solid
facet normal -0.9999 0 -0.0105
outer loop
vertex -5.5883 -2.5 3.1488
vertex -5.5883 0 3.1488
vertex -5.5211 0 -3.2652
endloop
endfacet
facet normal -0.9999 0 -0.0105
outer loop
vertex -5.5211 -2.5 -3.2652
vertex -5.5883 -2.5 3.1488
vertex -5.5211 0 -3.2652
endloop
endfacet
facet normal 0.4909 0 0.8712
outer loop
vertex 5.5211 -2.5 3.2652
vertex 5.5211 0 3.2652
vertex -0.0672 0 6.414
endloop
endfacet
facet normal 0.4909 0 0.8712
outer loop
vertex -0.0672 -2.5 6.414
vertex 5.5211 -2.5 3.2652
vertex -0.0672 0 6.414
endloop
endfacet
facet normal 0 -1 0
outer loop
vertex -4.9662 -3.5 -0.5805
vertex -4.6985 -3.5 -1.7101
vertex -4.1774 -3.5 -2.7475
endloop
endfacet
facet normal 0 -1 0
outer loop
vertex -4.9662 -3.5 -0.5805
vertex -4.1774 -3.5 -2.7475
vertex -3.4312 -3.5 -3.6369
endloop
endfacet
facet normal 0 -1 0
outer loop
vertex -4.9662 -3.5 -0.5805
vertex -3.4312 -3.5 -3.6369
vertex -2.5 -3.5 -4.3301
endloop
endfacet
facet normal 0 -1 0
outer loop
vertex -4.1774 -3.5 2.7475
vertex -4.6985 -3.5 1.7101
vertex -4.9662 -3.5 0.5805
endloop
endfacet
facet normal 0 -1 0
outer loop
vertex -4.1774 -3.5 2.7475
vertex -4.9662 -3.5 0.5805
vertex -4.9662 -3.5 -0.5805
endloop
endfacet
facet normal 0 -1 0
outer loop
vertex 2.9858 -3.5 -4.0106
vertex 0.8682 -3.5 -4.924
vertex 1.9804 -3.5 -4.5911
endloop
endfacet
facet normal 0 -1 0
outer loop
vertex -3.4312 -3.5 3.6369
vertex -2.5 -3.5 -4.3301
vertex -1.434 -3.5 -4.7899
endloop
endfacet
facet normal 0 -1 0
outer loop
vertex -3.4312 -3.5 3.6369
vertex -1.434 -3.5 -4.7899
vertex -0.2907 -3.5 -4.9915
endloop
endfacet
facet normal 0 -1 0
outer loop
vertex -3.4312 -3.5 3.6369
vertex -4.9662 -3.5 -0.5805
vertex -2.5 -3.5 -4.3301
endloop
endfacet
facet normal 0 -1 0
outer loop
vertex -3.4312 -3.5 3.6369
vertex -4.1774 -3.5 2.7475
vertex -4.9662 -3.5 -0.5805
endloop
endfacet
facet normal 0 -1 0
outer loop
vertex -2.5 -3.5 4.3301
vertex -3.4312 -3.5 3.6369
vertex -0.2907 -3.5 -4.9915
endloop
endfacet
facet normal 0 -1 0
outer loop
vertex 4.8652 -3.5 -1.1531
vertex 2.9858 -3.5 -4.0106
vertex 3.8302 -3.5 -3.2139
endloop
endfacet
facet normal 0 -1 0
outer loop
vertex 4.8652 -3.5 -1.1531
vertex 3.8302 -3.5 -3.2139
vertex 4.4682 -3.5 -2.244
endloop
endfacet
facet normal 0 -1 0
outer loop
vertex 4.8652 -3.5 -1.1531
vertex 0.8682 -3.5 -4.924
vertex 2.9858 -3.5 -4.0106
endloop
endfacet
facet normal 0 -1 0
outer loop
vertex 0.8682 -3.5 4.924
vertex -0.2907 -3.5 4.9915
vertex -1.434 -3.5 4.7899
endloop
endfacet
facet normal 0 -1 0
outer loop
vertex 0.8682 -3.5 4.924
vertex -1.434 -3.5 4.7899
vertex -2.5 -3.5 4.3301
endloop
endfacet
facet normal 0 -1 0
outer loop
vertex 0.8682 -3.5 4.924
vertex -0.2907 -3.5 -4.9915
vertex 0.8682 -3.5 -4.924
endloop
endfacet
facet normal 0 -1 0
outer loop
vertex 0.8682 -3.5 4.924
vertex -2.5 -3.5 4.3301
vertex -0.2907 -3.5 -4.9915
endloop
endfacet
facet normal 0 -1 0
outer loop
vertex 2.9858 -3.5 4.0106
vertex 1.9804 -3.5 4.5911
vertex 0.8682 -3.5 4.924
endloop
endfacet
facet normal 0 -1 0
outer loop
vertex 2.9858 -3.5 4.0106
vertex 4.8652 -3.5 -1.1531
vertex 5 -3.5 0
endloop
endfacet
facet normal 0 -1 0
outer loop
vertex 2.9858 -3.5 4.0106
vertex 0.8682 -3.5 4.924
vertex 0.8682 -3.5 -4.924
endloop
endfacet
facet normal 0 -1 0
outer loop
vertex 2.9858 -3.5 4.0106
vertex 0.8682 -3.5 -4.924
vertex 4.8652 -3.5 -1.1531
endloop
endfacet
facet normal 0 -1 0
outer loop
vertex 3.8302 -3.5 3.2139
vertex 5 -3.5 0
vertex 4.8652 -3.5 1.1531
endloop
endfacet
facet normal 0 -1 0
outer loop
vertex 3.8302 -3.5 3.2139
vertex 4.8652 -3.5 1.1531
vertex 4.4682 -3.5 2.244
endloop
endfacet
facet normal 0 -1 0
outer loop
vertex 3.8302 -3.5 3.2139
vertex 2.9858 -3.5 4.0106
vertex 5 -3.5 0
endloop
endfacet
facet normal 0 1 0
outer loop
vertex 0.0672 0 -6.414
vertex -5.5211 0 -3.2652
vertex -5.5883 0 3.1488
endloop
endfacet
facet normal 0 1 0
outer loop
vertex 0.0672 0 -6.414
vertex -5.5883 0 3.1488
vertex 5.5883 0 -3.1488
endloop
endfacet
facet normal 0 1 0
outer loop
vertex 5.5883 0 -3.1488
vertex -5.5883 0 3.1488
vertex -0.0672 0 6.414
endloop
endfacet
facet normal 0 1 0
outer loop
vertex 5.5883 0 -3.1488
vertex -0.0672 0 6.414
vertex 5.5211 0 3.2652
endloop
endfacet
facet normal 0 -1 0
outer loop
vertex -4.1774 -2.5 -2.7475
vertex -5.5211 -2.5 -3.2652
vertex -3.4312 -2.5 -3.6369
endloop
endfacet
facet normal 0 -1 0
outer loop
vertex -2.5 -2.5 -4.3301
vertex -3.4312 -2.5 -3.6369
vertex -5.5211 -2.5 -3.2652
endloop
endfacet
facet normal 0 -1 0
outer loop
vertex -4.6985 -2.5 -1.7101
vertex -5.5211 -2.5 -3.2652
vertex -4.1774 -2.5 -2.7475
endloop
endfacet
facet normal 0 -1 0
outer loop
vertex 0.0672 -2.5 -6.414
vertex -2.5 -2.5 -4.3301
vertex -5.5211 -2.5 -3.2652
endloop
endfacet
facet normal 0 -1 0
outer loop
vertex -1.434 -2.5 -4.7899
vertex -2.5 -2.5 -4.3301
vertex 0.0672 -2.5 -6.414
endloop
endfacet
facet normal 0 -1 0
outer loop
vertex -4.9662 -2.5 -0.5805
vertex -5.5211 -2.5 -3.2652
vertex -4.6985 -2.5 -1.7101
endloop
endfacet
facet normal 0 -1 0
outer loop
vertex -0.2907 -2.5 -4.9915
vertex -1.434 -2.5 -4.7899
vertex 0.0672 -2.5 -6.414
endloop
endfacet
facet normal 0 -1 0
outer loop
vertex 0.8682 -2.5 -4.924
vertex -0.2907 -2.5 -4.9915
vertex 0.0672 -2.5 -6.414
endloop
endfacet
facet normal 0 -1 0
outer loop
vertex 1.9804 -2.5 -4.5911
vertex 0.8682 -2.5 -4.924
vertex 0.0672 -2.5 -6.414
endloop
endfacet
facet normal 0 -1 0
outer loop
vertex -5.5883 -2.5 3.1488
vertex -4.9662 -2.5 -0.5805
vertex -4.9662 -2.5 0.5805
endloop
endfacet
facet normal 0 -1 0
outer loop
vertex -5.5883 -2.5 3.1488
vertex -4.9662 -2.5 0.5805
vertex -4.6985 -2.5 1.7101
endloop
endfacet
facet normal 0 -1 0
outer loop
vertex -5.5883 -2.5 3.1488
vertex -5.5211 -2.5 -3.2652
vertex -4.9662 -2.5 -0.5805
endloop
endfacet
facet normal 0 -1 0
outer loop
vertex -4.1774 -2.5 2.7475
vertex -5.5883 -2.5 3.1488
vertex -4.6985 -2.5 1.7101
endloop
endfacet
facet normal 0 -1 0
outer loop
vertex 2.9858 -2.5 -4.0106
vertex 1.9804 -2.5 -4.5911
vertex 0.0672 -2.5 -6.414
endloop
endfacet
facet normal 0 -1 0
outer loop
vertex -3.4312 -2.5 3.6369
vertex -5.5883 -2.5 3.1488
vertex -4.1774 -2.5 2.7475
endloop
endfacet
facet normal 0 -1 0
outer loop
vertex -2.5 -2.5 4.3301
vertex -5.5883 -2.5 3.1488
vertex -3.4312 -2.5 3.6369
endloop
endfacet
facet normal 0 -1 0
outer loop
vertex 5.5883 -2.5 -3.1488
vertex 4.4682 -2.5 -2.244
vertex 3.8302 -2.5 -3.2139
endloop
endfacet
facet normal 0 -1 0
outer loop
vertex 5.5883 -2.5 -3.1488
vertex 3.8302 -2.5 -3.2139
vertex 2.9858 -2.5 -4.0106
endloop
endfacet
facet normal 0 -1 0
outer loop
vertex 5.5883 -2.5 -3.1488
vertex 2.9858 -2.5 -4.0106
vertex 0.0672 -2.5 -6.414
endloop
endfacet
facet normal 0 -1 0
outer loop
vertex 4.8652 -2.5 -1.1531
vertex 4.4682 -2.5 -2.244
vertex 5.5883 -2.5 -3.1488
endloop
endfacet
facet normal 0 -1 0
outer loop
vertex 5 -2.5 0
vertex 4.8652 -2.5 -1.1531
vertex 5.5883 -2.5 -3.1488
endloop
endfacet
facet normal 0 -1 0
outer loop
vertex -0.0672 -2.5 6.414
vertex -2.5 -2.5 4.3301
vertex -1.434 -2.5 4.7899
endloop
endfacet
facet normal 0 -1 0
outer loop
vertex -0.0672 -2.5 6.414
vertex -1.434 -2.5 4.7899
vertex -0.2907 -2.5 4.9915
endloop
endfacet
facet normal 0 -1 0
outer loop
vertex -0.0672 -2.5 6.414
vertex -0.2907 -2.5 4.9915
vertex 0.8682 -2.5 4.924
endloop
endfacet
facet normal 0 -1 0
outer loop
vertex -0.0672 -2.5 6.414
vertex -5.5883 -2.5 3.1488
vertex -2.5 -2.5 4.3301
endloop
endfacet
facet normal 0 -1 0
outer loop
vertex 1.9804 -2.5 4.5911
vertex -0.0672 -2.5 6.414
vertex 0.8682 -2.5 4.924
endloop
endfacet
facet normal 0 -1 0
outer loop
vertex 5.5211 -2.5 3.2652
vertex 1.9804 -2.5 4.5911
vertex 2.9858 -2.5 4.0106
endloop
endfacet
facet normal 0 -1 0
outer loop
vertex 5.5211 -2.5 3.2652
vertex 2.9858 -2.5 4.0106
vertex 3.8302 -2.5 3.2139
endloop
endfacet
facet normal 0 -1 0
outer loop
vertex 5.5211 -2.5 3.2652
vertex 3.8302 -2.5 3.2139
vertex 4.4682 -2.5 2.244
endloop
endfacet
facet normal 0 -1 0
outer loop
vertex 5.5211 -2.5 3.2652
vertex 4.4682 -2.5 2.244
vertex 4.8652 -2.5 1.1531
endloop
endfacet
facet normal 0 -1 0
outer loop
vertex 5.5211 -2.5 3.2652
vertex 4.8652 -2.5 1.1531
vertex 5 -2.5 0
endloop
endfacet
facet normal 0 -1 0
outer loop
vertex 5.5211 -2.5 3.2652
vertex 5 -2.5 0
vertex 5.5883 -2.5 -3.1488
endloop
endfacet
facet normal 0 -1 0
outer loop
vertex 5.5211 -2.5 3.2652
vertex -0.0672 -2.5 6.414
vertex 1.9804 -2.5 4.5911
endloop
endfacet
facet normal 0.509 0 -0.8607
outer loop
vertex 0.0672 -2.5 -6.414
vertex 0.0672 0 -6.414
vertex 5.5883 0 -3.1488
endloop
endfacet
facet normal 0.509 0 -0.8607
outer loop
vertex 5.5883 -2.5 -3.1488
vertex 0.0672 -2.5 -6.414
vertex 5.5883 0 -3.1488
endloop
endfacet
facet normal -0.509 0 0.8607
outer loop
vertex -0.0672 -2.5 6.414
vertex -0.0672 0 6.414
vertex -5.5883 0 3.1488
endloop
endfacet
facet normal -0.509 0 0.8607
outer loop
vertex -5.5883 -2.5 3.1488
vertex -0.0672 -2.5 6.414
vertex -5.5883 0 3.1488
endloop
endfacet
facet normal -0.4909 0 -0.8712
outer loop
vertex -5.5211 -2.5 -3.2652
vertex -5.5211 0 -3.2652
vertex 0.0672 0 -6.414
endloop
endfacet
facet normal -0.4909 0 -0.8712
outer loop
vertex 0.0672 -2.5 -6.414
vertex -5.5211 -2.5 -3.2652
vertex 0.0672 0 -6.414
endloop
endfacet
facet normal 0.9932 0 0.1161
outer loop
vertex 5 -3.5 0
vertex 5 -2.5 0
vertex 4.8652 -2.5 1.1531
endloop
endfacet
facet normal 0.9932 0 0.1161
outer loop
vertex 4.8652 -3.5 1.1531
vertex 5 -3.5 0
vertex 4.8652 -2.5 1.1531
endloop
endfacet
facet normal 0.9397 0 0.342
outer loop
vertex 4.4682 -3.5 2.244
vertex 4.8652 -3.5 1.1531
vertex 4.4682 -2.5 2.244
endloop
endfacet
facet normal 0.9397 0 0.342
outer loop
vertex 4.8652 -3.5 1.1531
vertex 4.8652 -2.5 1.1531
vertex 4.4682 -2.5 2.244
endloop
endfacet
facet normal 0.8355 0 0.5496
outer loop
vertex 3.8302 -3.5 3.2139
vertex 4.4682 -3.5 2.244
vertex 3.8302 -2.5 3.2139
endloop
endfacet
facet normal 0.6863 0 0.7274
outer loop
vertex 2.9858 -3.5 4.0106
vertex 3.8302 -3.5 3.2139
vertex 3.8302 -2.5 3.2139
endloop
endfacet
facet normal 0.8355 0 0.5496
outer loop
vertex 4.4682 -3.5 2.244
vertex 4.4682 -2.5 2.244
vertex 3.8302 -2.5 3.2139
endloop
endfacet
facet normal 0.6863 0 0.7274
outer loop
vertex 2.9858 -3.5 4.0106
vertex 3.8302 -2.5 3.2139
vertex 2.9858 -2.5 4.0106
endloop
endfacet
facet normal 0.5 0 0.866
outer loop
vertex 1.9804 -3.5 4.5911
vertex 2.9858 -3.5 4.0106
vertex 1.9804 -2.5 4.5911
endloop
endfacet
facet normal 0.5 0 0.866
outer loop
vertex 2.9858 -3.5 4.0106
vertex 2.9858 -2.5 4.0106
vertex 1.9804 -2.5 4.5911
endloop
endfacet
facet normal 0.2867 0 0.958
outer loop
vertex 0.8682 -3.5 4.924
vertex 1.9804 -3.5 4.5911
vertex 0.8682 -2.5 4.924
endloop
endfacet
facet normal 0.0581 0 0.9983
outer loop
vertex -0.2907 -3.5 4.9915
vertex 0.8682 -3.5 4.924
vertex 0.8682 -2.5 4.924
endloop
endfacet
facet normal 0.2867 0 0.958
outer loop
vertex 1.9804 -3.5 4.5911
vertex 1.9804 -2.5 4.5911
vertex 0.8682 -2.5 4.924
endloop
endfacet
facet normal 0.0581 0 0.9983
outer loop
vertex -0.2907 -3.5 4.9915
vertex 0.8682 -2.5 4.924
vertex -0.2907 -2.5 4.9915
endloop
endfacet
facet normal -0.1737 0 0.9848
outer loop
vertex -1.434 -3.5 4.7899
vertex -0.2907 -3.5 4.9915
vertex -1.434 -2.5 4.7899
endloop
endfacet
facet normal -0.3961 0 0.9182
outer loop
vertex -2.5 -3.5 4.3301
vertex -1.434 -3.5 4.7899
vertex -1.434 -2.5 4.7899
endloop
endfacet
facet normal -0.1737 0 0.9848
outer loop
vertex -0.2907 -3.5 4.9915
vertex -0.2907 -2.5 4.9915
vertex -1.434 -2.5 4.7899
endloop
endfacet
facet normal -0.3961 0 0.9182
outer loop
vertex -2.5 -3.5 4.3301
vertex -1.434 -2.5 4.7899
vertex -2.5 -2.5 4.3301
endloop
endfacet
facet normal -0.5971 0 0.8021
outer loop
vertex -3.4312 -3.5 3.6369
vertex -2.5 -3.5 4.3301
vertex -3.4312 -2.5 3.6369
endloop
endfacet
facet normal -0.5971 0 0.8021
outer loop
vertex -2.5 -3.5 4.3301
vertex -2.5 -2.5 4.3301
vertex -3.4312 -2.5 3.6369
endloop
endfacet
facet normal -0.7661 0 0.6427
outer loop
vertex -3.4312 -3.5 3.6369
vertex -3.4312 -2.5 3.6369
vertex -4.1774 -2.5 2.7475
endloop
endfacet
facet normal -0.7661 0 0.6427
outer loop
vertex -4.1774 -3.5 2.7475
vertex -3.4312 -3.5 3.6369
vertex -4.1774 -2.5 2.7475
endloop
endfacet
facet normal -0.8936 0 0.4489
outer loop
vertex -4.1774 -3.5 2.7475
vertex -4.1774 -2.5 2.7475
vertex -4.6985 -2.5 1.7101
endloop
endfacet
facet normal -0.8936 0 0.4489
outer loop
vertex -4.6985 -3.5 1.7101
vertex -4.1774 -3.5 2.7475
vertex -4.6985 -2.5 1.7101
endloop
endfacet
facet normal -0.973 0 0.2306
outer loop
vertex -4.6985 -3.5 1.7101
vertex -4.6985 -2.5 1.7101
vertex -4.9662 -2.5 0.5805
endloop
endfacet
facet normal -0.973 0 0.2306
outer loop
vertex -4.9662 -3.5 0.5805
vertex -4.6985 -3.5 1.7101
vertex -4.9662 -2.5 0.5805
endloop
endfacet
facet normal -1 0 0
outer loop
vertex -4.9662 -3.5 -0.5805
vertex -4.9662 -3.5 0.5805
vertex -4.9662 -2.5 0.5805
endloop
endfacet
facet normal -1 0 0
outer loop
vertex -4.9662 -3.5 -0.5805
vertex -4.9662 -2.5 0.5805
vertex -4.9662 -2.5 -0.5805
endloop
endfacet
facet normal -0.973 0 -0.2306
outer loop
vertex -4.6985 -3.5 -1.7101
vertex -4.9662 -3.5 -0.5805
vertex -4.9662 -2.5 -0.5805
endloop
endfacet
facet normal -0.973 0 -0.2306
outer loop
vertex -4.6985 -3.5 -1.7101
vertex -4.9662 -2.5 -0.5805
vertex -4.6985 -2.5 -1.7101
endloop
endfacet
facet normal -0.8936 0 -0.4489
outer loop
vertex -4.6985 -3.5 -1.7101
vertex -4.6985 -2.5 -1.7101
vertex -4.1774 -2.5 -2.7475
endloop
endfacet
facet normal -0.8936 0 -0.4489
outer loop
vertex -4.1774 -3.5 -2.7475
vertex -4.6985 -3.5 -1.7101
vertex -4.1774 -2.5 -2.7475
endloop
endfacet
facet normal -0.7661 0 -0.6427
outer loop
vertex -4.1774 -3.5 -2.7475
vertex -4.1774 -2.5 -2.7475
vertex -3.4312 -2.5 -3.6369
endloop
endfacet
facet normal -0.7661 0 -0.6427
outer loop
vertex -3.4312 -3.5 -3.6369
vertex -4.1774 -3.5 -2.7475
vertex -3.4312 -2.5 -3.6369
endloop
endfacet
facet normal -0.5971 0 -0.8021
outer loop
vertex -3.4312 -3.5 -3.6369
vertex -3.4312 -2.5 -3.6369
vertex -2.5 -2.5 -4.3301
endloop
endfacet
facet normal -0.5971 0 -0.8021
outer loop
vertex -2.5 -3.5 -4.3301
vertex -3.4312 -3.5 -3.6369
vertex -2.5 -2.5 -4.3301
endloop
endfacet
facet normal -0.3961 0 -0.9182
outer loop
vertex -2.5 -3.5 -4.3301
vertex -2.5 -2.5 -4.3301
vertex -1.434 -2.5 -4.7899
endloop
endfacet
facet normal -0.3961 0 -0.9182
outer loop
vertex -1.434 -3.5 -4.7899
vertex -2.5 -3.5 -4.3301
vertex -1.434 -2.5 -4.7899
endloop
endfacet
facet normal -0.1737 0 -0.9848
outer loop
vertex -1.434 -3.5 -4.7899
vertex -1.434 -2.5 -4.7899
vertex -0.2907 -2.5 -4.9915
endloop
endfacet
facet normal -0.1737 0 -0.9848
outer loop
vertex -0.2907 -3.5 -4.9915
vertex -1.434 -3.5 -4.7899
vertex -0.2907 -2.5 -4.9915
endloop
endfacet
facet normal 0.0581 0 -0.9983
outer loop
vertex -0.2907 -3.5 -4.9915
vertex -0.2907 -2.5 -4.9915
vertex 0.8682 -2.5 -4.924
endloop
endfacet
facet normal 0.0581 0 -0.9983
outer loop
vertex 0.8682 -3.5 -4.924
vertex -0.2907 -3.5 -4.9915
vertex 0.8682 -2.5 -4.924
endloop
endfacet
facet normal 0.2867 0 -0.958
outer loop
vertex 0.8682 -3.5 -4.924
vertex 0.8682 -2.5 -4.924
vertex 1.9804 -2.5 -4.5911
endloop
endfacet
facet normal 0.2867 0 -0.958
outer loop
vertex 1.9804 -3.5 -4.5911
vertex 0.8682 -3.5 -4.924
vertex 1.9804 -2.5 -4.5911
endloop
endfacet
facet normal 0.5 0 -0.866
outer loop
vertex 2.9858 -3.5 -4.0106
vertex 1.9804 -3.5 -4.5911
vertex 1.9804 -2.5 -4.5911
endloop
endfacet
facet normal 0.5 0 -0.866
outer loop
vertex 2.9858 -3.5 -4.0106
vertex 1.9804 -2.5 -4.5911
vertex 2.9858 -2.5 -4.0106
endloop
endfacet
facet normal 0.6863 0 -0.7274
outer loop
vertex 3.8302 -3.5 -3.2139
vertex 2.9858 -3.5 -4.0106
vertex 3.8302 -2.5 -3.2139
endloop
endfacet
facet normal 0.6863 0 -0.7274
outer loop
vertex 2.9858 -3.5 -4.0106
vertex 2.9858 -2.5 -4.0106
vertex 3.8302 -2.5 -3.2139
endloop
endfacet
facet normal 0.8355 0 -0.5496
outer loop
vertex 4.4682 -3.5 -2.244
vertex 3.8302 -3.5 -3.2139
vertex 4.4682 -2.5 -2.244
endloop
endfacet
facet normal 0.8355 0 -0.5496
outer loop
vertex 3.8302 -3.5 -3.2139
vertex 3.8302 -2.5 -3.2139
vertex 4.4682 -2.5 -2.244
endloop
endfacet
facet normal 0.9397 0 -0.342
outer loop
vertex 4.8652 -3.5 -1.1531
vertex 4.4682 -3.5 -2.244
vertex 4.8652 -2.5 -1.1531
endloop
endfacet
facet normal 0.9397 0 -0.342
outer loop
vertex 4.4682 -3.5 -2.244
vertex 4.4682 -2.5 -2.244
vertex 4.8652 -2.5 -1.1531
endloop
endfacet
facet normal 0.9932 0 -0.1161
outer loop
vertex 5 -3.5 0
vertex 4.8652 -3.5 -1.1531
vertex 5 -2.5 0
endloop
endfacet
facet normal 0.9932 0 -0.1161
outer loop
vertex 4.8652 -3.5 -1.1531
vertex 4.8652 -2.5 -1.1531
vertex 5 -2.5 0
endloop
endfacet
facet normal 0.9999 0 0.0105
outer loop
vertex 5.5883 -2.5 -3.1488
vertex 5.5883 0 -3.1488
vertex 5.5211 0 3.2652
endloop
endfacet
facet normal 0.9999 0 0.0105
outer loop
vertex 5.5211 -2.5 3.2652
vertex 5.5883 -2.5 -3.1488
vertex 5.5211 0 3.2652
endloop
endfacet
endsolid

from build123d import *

# Parameters (mm, degrees)
F1_DEPTH = 2.5
F2_R     = 5
F3_DEPTH = 3.5


with BuildPart() as f1:
    # F0 (on Front) → F1 (new body)
    with BuildSketch(Plane.XZ):
        Polygon((-0.067167, 6.41401), (-5.588279, 3.148836), (-5.521112, -3.265174), (0.067167, -6.41401), (5.588279, -3.148836), (5.521112, 3.265174), align=None)
    extrude(amount=F1_DEPTH)

    # F2 (on Front) → F3 (join)
    with BuildSketch(Plane.XZ):
        Circle(F2_R)
    extrude(amount=F3_DEPTH)


solid = f1.part
